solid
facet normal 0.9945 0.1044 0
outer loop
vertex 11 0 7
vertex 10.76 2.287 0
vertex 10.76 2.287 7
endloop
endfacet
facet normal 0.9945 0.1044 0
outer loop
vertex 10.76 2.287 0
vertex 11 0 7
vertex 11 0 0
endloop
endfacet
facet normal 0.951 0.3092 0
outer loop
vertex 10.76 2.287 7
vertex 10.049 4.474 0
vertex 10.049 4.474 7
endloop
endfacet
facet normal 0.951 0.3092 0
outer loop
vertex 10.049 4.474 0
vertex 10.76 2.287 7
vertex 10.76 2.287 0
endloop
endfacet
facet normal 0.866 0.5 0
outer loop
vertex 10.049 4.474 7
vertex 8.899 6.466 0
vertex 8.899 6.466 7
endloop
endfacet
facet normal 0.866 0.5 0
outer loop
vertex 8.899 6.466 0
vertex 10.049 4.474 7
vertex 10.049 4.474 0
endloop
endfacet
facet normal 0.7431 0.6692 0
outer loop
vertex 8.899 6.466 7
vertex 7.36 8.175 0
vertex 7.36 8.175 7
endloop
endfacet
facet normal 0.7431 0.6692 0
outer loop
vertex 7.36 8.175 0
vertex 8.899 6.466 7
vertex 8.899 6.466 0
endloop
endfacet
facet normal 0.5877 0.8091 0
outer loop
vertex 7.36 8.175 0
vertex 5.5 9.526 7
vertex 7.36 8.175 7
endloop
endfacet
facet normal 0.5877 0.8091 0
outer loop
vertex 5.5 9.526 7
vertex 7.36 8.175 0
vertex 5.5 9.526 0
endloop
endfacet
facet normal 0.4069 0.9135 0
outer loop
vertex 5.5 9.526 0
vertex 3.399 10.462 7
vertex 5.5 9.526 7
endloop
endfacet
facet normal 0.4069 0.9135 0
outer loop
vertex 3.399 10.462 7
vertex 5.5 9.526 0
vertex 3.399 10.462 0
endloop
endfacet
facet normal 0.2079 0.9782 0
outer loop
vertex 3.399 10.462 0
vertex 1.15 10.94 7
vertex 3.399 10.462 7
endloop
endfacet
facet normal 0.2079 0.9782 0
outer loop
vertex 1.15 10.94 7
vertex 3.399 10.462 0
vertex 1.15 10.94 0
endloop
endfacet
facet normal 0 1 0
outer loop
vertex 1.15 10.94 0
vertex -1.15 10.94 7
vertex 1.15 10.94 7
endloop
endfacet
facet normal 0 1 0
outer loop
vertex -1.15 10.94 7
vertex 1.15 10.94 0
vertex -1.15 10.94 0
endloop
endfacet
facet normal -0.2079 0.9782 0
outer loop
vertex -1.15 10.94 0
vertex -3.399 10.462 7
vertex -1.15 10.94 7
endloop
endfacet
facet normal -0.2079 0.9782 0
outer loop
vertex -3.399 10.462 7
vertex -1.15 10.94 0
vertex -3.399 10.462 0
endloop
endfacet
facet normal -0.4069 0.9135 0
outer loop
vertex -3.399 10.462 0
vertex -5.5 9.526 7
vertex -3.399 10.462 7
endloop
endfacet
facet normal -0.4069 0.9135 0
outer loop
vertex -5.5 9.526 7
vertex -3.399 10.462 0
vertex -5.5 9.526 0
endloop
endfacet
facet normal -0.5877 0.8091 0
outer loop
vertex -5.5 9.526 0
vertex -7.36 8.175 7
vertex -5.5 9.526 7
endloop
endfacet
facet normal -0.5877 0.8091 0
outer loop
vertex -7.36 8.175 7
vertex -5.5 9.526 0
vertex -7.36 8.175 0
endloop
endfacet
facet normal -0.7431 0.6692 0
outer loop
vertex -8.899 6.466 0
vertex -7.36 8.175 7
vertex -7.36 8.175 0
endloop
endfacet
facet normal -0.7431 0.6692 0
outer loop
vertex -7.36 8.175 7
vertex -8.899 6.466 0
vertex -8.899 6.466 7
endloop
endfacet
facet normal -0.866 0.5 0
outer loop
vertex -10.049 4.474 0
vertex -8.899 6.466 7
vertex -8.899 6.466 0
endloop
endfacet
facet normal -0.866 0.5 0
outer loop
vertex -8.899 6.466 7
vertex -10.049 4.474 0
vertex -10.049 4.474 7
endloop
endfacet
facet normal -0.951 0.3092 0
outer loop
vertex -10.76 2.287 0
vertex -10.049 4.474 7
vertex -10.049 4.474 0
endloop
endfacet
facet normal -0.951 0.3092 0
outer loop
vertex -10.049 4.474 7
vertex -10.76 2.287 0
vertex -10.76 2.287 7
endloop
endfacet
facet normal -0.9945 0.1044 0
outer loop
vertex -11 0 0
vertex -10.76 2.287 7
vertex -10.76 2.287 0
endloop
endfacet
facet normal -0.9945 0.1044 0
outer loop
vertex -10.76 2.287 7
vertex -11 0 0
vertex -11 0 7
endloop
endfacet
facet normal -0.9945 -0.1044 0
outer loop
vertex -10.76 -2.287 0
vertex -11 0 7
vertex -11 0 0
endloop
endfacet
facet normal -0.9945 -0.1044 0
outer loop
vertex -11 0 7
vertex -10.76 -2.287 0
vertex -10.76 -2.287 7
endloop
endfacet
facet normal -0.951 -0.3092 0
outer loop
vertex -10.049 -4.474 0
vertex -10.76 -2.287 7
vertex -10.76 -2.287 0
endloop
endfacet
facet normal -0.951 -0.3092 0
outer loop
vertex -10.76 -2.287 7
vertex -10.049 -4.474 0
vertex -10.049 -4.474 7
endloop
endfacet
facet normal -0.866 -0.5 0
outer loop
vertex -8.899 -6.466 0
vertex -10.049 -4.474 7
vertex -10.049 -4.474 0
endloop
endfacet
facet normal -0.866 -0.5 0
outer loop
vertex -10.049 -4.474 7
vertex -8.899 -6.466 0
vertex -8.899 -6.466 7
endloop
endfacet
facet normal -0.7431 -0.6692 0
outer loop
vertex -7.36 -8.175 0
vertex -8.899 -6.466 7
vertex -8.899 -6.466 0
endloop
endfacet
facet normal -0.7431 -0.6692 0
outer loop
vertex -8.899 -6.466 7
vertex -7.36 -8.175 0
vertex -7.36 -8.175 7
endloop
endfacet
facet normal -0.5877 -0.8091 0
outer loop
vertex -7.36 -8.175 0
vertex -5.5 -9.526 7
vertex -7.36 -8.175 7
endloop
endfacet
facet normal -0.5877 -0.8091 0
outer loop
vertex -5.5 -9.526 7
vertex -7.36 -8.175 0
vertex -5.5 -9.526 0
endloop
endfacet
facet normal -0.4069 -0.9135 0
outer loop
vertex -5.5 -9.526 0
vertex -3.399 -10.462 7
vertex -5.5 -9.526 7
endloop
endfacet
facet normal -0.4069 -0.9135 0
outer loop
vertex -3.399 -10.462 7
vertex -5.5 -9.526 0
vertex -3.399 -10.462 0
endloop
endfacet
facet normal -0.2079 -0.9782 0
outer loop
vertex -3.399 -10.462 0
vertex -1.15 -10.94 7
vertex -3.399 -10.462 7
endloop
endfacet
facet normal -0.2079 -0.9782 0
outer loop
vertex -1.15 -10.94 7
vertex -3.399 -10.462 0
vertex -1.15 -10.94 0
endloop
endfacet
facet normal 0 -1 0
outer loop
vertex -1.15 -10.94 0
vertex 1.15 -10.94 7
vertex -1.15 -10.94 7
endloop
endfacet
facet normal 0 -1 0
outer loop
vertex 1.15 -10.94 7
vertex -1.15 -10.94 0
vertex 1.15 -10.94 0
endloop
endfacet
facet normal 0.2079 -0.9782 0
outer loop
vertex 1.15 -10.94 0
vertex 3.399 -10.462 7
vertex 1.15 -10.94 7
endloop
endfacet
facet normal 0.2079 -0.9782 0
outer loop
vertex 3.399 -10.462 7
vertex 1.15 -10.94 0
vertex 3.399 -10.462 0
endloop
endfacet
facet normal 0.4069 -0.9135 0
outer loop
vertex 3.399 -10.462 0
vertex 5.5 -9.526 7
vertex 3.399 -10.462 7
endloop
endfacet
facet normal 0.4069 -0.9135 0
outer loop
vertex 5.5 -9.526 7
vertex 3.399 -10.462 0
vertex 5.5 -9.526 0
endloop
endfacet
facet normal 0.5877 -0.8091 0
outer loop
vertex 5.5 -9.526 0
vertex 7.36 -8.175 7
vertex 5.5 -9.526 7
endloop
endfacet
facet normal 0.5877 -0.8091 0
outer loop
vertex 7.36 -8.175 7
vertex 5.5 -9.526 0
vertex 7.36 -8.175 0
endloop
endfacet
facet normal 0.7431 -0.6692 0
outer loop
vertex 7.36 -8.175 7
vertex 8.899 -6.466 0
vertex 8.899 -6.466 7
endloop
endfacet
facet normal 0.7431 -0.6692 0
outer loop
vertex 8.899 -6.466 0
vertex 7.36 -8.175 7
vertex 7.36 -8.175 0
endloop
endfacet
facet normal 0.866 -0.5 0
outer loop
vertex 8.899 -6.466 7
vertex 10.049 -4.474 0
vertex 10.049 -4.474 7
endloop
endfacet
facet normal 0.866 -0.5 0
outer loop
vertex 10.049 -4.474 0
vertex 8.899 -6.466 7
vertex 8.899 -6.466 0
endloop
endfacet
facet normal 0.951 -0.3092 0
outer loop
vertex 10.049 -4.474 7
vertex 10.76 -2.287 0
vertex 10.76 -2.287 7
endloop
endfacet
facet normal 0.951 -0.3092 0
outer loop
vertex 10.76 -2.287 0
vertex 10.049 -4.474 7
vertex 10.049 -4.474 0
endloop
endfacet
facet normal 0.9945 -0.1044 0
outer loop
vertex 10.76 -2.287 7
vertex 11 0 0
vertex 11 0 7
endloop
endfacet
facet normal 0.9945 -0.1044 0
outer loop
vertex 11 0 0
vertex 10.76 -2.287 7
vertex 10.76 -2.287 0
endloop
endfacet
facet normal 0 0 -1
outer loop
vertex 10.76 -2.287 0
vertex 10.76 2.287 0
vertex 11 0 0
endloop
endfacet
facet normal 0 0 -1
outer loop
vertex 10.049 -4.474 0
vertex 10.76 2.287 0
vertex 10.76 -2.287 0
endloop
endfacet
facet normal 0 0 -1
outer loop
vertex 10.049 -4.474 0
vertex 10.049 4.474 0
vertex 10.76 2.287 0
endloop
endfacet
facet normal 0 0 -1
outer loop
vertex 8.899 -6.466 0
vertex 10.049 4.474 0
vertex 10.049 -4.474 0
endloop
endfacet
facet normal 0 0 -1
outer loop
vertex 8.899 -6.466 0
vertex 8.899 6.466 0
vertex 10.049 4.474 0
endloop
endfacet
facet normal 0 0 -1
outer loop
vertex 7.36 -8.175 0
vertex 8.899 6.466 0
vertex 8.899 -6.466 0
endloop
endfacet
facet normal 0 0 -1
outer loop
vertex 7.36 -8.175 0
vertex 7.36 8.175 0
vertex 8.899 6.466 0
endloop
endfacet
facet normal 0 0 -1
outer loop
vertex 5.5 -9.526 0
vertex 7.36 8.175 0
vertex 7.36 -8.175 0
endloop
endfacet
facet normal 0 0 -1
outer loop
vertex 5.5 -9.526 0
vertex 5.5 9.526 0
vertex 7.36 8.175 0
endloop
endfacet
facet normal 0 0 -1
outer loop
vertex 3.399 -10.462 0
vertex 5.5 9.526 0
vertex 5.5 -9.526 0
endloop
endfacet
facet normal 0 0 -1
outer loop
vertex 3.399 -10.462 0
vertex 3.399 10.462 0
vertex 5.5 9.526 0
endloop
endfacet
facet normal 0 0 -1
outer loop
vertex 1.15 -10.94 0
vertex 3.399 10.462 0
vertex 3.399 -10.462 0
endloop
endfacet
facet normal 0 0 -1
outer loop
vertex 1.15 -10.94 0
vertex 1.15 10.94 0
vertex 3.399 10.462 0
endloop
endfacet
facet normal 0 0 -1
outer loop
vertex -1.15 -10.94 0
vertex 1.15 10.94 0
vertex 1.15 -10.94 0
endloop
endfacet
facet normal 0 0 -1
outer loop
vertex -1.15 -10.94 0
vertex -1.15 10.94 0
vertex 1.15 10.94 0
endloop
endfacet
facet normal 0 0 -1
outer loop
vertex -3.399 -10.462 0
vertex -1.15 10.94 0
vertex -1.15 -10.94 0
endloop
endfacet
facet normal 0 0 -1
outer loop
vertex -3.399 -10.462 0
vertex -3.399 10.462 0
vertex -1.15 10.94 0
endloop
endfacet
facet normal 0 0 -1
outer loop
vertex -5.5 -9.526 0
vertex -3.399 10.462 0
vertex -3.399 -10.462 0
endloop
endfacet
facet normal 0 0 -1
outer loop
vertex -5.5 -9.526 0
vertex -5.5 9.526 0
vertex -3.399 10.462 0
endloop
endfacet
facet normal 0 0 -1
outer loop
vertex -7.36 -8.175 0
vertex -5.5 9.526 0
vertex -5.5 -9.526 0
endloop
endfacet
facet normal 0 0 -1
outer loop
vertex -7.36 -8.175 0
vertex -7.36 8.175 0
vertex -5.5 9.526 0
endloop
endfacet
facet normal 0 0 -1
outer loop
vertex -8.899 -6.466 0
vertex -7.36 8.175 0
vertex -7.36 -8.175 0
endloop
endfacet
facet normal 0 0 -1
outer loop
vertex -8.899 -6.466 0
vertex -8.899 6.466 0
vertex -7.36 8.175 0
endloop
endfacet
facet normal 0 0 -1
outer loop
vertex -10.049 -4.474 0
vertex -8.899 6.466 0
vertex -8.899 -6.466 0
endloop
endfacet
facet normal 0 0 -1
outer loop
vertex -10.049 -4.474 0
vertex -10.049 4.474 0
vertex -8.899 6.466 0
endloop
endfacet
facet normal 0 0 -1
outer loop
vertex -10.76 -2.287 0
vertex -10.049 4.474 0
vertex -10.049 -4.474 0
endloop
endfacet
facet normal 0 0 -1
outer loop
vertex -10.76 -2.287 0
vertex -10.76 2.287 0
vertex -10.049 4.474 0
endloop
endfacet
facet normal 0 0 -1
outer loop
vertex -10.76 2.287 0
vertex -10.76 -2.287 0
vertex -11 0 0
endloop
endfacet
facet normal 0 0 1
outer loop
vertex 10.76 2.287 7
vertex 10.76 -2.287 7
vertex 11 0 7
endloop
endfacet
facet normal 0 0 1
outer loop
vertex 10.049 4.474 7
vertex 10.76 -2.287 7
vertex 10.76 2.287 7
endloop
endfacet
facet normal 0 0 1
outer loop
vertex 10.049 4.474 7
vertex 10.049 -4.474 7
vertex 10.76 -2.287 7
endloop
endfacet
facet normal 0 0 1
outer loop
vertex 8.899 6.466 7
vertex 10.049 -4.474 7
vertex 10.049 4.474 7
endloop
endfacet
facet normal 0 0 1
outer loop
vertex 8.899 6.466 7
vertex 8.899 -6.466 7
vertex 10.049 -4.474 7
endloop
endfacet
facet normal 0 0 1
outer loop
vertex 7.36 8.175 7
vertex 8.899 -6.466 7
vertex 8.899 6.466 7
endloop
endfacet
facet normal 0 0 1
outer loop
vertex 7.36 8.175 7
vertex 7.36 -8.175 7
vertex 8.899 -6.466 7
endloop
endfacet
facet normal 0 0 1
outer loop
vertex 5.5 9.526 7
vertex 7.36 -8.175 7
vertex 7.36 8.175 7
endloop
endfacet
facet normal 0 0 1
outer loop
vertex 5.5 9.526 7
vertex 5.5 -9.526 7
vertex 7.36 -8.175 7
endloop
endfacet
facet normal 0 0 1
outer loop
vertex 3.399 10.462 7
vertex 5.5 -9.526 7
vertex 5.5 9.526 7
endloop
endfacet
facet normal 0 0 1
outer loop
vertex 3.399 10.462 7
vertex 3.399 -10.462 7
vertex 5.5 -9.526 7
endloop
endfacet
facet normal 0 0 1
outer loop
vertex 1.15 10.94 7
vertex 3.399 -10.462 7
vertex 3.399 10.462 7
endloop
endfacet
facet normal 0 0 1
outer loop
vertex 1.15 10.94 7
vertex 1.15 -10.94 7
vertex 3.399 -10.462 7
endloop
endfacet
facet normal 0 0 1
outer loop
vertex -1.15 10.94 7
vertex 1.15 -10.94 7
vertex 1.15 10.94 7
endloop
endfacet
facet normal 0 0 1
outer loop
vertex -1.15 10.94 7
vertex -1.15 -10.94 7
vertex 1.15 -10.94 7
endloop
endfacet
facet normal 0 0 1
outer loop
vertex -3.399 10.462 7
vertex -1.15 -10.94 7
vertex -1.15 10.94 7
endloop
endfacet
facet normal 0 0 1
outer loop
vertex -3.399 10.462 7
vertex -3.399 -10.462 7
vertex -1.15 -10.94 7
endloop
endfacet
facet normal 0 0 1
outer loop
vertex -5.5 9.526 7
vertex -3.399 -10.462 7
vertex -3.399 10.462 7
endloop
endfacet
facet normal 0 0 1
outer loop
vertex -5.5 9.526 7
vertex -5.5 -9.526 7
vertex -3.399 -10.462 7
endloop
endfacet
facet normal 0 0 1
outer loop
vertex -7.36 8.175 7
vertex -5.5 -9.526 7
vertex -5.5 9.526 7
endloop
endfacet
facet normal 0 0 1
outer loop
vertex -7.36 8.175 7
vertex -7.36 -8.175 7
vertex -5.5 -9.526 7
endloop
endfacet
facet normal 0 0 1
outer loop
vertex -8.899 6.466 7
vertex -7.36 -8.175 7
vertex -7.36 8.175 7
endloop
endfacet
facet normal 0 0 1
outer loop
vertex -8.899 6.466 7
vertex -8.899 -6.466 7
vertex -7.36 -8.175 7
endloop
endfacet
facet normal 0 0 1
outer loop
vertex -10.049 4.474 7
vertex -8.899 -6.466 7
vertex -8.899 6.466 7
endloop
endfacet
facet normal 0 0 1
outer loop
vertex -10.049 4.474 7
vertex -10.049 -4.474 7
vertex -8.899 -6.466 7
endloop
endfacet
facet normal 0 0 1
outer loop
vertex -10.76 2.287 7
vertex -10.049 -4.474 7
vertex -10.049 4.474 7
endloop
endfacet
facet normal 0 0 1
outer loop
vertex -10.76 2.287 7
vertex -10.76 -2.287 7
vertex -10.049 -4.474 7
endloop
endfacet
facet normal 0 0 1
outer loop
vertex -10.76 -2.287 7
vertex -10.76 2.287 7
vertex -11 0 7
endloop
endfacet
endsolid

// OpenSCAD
// Generated by SolidPython 1.0.1 on 2020-07-29 00:39:25


cylinder(h = 7, r1 = 11, r2 = 11);
/***********************************************
*********      SolidPython code:      **********
************************************************
 
# import packages: SolidPython
from solid import *
from solid.utils import *
from itertools import chain, combinations


class Resize:

    def __init__(self, scad_file):
        self.scad_file = scad_file
        #self.scad_file = import_scad(scad_file)
        # cone/cylinder param:
        self.r1 = 0
        self.r2 = 0
        self.h = 0
        # rectangular prism param:
        self.w = 0
        self.l = 0
        # ellipse param:
        self.r = 0

    # import OpenScad code (file name corresponds to shape)


    # classify shape + parameters
    def assign(self, param1, param2, param3):
        if self.scad_file == 'cone.scad':
            self.r1 = param1
            self.r2 = param2
            self.h = param3
        elif self.scad_file == 'cylinder.scad':
            self.r1 = param1
            self.r2 = param2
            self.h = param3
        elif self.scad_file == 'rectangularPrism.scad':
            self.h = param1
            self.l = param2
            self.w = param3
        else:
            self.r = param1
            self.h = param2

    # resize parameters
    def iterate(self):
        x = range(3, 20, 2)
        i = 1
        if self.scad_file == 'cone.scad':
            tempList = list(combinations(x, 2))
            for temp in tempList:
                param1 = temp[0]
                param2 = temp[1]
                filepath = 'produced_scad_files/' + 'cone' + str(param1) + '_' + str(param2) + '_' + '.scad'
                scad_render_to_file(cylinder(h=param1, r1=param2, r2=0), filepath)

        elif self.scad_file == 'cylinder.scad':
            tempList = list(combinations(x, 3))
            for temp in tempList:
                param1 = temp[0]
                param2 = temp[1]
                filepath = 'produced_scad_files/' + 'cylinder' + str(param1) + '_' + str(param2) + '_' + '.scad'
                scad_render_to_file(cylinder(h=param1, r1=param2, r2=param2), filepath)

        elif self.scad_file == 'rectangularPrism.scad':
            tempList = list(combinations(x, 3))
            for temp in tempList:
                param1 = temp[0]
                param2 = temp[1]
                param3 = temp[2]
                filepath = 'produced_scad_files/' + 'rectangularPrism' + str(param1) + '_' + str(param2) + '_' + str(
                    param3) + '.scad'
                scad_render_to_file(cube(size=(param1, param2, param3)), filepath)

        elif self.scad_file == 'ellipse.scad':
            tempList = list(combinations(x, 4))
            for temp in tempList:
                param1 = temp[0]
                param2 = temp[1]
                param3 = temp[2]
                param4 = temp[3]
                filepath = 'produced_scad_files/' + 'ellipse' + str(param1) + '_' + str(param2) + '_' + str(param3) + '_' + str(param4) + '.scad'
                scad_render_to_file(scale([param1, param2, param3])(sphere(r=param4)), filepath)

    def render_to_scadfile(self):
        scad_render_to_file(scad, 'example.scad') 
 
************************************************/
